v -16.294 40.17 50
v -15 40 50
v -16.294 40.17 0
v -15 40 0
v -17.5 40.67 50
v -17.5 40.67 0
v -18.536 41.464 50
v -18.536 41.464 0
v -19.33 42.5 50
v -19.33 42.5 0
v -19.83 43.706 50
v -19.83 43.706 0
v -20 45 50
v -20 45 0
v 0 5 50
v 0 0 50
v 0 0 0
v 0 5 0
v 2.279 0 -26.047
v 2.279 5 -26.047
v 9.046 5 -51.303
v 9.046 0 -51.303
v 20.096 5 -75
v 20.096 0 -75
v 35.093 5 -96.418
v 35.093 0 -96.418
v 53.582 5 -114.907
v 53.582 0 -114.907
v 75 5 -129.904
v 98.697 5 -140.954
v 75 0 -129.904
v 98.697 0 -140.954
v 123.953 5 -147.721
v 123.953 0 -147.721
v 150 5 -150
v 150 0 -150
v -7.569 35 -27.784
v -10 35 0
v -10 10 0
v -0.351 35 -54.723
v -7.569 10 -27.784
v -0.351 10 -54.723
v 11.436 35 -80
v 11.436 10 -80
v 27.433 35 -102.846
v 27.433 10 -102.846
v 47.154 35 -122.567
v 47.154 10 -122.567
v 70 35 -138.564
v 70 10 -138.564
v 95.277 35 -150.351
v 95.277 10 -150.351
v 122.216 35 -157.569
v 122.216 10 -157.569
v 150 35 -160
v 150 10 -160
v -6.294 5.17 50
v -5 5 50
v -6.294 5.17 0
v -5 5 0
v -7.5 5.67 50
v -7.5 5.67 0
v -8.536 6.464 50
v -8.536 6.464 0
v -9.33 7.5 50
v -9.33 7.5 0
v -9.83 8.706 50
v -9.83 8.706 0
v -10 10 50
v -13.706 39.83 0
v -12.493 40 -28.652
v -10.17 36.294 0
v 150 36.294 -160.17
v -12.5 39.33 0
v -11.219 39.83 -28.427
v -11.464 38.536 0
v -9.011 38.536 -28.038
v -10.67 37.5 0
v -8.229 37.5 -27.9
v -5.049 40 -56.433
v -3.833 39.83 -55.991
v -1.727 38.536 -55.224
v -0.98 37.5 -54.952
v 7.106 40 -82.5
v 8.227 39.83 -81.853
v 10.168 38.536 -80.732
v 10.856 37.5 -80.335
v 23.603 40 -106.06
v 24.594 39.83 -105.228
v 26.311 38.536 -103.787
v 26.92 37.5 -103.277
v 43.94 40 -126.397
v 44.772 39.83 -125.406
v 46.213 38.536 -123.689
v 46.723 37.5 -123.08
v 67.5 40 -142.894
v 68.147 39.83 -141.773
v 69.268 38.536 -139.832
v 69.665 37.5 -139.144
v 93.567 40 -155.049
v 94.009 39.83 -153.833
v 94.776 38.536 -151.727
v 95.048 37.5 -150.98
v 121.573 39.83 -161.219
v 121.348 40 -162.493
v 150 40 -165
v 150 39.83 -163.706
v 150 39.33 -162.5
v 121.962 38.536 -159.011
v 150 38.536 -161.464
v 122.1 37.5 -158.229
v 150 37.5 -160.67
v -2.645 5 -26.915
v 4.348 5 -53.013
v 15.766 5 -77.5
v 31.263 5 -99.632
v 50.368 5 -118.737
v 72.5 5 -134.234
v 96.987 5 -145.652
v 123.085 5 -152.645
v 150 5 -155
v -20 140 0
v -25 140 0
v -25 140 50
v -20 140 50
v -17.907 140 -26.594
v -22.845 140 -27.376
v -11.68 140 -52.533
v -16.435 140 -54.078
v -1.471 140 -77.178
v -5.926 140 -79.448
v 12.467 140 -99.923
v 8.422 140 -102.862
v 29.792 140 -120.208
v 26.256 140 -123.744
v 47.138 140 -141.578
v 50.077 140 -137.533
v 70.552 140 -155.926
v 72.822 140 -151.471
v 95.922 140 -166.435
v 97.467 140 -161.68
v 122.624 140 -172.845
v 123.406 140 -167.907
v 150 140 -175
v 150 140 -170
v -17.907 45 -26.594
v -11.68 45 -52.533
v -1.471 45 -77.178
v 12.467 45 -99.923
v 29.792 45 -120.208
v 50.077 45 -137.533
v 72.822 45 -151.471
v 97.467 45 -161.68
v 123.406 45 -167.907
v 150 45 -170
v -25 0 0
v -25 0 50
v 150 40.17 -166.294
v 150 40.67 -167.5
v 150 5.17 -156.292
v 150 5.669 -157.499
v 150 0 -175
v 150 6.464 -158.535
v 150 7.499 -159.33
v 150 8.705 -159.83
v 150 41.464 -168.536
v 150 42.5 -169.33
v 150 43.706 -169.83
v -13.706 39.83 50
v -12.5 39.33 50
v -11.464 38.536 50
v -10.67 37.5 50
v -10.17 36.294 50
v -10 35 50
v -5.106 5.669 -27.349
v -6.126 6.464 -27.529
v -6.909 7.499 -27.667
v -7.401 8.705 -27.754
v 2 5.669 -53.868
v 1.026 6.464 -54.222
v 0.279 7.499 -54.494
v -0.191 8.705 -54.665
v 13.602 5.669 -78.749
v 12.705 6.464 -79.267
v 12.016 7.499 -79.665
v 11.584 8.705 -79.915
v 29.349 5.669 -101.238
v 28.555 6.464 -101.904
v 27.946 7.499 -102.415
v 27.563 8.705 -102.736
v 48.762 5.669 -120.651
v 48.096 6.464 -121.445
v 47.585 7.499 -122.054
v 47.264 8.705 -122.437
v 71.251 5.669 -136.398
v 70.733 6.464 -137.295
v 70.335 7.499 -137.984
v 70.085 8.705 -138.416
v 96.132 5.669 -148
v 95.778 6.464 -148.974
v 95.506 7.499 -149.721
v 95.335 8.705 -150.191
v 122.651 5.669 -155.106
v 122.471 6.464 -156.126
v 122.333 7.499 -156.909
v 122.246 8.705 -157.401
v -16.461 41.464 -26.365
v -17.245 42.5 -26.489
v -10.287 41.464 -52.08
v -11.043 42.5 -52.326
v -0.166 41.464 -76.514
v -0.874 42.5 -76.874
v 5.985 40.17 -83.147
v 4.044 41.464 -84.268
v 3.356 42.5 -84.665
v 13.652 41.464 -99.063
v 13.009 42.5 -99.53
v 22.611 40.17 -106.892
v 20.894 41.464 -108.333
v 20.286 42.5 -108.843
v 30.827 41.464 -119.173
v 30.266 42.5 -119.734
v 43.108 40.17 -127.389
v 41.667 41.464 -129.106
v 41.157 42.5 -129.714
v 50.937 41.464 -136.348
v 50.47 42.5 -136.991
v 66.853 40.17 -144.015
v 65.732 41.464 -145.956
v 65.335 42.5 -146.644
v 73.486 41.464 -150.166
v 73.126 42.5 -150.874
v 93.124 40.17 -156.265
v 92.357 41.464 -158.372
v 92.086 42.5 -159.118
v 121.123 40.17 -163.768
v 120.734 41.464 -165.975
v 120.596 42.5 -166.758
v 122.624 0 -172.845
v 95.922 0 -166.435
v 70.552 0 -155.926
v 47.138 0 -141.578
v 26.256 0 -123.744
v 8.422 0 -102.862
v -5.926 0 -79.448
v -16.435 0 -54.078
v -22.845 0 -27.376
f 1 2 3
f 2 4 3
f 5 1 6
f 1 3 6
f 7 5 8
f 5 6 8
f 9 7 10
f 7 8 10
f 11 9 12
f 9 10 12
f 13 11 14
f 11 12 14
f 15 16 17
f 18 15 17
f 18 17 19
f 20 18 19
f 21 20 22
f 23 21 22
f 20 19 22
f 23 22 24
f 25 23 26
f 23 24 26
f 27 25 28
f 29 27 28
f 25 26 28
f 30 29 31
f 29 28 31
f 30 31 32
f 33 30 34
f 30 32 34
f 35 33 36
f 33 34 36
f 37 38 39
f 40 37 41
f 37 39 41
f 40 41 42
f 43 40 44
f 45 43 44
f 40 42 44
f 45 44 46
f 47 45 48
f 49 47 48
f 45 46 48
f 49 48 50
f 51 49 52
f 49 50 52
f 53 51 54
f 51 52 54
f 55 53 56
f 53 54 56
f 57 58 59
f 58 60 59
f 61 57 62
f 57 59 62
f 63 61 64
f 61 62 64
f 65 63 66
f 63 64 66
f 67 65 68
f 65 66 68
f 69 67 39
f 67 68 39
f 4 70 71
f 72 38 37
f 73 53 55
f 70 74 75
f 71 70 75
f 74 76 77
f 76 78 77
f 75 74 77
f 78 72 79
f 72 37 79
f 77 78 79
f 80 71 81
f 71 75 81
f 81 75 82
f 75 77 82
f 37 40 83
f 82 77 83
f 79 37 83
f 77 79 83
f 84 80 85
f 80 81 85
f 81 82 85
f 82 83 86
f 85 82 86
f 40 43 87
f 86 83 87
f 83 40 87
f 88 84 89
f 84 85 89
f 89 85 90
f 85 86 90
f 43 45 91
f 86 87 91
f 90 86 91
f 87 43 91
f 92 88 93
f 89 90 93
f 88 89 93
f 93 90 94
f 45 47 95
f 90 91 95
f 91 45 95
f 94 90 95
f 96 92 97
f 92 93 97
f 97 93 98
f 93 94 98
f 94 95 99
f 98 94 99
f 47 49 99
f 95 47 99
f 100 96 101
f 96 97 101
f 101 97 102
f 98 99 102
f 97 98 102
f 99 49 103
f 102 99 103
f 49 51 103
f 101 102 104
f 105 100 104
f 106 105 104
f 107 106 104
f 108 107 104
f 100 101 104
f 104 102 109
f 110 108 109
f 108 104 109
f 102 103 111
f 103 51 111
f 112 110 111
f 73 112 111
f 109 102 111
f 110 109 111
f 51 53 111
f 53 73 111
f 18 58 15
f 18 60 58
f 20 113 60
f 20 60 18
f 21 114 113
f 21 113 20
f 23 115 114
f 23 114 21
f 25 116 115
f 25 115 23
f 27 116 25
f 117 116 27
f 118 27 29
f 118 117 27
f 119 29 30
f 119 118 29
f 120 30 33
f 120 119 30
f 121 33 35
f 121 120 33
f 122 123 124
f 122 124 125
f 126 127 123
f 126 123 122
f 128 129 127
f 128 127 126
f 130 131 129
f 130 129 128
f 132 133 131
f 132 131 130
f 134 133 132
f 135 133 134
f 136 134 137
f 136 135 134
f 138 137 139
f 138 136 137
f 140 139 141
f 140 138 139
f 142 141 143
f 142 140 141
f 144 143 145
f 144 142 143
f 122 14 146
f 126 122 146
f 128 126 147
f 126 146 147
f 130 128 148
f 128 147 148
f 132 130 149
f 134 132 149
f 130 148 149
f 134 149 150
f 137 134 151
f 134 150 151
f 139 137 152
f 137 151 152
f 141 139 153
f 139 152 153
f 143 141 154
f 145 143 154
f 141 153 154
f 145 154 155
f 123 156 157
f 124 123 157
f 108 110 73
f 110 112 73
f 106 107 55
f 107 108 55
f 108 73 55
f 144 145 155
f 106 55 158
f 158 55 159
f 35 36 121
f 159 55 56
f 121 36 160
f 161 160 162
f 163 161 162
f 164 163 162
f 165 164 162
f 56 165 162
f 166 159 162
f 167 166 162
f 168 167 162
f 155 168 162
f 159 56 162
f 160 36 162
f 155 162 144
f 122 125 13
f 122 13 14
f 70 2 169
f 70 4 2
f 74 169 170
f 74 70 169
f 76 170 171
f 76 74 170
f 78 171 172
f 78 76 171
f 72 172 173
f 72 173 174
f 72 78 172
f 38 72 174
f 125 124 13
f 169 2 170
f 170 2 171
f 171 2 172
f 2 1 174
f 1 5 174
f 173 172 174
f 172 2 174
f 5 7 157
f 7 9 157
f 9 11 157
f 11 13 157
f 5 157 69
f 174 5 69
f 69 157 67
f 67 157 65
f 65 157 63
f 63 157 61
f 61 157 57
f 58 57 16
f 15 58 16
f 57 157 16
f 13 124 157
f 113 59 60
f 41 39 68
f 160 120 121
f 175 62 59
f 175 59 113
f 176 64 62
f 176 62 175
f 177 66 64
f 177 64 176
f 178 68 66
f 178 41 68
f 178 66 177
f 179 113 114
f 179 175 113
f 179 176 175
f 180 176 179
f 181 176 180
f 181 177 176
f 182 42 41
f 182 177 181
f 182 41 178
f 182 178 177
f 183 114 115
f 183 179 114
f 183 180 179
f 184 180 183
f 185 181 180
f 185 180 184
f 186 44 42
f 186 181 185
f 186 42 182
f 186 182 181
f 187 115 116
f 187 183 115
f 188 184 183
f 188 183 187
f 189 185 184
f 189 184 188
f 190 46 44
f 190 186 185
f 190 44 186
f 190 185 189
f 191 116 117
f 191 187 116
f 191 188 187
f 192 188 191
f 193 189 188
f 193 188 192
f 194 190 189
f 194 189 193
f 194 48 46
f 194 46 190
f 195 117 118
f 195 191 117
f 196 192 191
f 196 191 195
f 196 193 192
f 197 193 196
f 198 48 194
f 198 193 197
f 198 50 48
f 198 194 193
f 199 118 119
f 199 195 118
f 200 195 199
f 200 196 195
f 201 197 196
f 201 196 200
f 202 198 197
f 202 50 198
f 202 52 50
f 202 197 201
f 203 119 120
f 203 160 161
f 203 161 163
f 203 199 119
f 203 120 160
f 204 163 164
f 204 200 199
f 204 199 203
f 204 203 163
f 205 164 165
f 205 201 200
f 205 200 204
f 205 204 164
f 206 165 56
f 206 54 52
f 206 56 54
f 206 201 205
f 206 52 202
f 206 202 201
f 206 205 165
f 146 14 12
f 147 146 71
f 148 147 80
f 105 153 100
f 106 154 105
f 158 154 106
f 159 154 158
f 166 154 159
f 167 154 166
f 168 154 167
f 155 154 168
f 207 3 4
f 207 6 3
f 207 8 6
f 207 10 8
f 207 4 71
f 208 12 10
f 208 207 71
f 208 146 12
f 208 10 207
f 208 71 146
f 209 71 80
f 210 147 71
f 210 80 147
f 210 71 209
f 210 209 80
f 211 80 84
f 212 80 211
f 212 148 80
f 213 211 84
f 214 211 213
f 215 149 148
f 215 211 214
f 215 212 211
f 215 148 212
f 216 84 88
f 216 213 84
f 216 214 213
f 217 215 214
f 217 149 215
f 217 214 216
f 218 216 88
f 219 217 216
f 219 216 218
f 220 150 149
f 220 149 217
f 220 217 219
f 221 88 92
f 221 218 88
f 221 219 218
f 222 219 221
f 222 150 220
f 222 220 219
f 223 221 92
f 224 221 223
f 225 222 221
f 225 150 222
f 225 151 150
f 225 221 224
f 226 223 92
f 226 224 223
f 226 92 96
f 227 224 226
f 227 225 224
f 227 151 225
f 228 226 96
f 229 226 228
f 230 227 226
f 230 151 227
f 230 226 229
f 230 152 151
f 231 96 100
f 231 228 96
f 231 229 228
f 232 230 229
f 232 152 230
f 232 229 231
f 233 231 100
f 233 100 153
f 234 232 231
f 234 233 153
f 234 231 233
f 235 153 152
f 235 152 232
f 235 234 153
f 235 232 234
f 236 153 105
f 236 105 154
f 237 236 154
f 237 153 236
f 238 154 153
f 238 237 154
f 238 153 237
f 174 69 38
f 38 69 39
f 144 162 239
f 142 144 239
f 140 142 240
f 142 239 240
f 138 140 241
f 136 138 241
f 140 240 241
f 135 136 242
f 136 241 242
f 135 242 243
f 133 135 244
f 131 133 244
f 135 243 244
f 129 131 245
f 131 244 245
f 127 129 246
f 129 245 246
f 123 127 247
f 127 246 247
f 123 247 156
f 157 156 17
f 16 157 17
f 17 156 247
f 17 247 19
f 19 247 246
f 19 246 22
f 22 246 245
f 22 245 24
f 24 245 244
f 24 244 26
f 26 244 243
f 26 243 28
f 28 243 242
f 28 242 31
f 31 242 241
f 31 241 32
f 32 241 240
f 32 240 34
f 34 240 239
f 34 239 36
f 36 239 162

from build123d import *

# Parameters (mm, degrees)
BOTTOM_LEVEL_DEPTH = 5
MID_LEVEL_DEPTH    = 35
GUARD_RAIL_DEPTH   = 100
ROUNDING_R         = 5


with BuildPart() as part:
    # Sketch1 → Bottom level (new body)
    with BuildSketch(Plane(origin=(0, 0, 0), x_dir=(1, 0, 0), z_dir=(0, 1, 0))):
        with BuildLine():
            Line((150, 150), (150, 175))
            ThreePointArc((150, 175), (26.256313292, 123.743686708), (-25, 0))
            Line((-25, 0), (-25, -50))
            Line((-25, -50), (0, -50))
            Line((0, -50), (0, 0))
            ThreePointArc((0, 0), (43.933982822, 106.066017178), (150, 150))
        make_face()
    extrude(amount=BOTTOM_LEVEL_DEPTH)

    # Sketch2 → Mid level (add)
    with BuildSketch(Plane(origin=(0, 5, 0), x_dir=(1, 0, 0), z_dir=(0, 1, 0))):
        with BuildLine():
            Line((-25, 0), (-25, -50))
            Line((-25, -50), (-10, -50))
            Line((-10, -50), (-10, 0))
            ThreePointArc((-10, 0), (36.86291501, 113.13708499), (150, 160))
            Line((150, 160), (150, 175))
            ThreePointArc((150, 175), (26.256313292, 123.743686708), (-25, 0))
        make_face()
    extrude(amount=MID_LEVEL_DEPTH)

    # Sketch3 → Guard rail (add)
    with BuildSketch(Plane(origin=(0, 40, 0), x_dir=(1, 0, 0), z_dir=(0, 1, 0))):
        with BuildLine():
            Line((-25, 0), (-25, -50))
            Line((-25, -50), (-20, -50))
            Line((-20, -50), (-20, 0))
            ThreePointArc((-20, 0), (29.791847198, 120.208152802), (150, 170))
            Line((150, 170), (150, 175))
            ThreePointArc((150, 175), (26.256313292, 123.743686708), (-25, 0))
        make_face()
    extrude(amount=GUARD_RAIL_DEPTH)

    # Rounding
    rounding_edges = [part.edges().sort_by_distance(p)[0] for p in [
        (-10, 5, 25),
        (-10, 40, 25),
        (-20, 40, 25),
        (36.86291501, 5, -113.13708499),
        (36.86291501, 40, -113.13708499),
        (29.791847198, 40, -120.208152802),
    ]]
    fillet(rounding_edges, radius=ROUNDING_R - 0.0001)  # a hair under: the kernel refuses the full size


solid = part.part
